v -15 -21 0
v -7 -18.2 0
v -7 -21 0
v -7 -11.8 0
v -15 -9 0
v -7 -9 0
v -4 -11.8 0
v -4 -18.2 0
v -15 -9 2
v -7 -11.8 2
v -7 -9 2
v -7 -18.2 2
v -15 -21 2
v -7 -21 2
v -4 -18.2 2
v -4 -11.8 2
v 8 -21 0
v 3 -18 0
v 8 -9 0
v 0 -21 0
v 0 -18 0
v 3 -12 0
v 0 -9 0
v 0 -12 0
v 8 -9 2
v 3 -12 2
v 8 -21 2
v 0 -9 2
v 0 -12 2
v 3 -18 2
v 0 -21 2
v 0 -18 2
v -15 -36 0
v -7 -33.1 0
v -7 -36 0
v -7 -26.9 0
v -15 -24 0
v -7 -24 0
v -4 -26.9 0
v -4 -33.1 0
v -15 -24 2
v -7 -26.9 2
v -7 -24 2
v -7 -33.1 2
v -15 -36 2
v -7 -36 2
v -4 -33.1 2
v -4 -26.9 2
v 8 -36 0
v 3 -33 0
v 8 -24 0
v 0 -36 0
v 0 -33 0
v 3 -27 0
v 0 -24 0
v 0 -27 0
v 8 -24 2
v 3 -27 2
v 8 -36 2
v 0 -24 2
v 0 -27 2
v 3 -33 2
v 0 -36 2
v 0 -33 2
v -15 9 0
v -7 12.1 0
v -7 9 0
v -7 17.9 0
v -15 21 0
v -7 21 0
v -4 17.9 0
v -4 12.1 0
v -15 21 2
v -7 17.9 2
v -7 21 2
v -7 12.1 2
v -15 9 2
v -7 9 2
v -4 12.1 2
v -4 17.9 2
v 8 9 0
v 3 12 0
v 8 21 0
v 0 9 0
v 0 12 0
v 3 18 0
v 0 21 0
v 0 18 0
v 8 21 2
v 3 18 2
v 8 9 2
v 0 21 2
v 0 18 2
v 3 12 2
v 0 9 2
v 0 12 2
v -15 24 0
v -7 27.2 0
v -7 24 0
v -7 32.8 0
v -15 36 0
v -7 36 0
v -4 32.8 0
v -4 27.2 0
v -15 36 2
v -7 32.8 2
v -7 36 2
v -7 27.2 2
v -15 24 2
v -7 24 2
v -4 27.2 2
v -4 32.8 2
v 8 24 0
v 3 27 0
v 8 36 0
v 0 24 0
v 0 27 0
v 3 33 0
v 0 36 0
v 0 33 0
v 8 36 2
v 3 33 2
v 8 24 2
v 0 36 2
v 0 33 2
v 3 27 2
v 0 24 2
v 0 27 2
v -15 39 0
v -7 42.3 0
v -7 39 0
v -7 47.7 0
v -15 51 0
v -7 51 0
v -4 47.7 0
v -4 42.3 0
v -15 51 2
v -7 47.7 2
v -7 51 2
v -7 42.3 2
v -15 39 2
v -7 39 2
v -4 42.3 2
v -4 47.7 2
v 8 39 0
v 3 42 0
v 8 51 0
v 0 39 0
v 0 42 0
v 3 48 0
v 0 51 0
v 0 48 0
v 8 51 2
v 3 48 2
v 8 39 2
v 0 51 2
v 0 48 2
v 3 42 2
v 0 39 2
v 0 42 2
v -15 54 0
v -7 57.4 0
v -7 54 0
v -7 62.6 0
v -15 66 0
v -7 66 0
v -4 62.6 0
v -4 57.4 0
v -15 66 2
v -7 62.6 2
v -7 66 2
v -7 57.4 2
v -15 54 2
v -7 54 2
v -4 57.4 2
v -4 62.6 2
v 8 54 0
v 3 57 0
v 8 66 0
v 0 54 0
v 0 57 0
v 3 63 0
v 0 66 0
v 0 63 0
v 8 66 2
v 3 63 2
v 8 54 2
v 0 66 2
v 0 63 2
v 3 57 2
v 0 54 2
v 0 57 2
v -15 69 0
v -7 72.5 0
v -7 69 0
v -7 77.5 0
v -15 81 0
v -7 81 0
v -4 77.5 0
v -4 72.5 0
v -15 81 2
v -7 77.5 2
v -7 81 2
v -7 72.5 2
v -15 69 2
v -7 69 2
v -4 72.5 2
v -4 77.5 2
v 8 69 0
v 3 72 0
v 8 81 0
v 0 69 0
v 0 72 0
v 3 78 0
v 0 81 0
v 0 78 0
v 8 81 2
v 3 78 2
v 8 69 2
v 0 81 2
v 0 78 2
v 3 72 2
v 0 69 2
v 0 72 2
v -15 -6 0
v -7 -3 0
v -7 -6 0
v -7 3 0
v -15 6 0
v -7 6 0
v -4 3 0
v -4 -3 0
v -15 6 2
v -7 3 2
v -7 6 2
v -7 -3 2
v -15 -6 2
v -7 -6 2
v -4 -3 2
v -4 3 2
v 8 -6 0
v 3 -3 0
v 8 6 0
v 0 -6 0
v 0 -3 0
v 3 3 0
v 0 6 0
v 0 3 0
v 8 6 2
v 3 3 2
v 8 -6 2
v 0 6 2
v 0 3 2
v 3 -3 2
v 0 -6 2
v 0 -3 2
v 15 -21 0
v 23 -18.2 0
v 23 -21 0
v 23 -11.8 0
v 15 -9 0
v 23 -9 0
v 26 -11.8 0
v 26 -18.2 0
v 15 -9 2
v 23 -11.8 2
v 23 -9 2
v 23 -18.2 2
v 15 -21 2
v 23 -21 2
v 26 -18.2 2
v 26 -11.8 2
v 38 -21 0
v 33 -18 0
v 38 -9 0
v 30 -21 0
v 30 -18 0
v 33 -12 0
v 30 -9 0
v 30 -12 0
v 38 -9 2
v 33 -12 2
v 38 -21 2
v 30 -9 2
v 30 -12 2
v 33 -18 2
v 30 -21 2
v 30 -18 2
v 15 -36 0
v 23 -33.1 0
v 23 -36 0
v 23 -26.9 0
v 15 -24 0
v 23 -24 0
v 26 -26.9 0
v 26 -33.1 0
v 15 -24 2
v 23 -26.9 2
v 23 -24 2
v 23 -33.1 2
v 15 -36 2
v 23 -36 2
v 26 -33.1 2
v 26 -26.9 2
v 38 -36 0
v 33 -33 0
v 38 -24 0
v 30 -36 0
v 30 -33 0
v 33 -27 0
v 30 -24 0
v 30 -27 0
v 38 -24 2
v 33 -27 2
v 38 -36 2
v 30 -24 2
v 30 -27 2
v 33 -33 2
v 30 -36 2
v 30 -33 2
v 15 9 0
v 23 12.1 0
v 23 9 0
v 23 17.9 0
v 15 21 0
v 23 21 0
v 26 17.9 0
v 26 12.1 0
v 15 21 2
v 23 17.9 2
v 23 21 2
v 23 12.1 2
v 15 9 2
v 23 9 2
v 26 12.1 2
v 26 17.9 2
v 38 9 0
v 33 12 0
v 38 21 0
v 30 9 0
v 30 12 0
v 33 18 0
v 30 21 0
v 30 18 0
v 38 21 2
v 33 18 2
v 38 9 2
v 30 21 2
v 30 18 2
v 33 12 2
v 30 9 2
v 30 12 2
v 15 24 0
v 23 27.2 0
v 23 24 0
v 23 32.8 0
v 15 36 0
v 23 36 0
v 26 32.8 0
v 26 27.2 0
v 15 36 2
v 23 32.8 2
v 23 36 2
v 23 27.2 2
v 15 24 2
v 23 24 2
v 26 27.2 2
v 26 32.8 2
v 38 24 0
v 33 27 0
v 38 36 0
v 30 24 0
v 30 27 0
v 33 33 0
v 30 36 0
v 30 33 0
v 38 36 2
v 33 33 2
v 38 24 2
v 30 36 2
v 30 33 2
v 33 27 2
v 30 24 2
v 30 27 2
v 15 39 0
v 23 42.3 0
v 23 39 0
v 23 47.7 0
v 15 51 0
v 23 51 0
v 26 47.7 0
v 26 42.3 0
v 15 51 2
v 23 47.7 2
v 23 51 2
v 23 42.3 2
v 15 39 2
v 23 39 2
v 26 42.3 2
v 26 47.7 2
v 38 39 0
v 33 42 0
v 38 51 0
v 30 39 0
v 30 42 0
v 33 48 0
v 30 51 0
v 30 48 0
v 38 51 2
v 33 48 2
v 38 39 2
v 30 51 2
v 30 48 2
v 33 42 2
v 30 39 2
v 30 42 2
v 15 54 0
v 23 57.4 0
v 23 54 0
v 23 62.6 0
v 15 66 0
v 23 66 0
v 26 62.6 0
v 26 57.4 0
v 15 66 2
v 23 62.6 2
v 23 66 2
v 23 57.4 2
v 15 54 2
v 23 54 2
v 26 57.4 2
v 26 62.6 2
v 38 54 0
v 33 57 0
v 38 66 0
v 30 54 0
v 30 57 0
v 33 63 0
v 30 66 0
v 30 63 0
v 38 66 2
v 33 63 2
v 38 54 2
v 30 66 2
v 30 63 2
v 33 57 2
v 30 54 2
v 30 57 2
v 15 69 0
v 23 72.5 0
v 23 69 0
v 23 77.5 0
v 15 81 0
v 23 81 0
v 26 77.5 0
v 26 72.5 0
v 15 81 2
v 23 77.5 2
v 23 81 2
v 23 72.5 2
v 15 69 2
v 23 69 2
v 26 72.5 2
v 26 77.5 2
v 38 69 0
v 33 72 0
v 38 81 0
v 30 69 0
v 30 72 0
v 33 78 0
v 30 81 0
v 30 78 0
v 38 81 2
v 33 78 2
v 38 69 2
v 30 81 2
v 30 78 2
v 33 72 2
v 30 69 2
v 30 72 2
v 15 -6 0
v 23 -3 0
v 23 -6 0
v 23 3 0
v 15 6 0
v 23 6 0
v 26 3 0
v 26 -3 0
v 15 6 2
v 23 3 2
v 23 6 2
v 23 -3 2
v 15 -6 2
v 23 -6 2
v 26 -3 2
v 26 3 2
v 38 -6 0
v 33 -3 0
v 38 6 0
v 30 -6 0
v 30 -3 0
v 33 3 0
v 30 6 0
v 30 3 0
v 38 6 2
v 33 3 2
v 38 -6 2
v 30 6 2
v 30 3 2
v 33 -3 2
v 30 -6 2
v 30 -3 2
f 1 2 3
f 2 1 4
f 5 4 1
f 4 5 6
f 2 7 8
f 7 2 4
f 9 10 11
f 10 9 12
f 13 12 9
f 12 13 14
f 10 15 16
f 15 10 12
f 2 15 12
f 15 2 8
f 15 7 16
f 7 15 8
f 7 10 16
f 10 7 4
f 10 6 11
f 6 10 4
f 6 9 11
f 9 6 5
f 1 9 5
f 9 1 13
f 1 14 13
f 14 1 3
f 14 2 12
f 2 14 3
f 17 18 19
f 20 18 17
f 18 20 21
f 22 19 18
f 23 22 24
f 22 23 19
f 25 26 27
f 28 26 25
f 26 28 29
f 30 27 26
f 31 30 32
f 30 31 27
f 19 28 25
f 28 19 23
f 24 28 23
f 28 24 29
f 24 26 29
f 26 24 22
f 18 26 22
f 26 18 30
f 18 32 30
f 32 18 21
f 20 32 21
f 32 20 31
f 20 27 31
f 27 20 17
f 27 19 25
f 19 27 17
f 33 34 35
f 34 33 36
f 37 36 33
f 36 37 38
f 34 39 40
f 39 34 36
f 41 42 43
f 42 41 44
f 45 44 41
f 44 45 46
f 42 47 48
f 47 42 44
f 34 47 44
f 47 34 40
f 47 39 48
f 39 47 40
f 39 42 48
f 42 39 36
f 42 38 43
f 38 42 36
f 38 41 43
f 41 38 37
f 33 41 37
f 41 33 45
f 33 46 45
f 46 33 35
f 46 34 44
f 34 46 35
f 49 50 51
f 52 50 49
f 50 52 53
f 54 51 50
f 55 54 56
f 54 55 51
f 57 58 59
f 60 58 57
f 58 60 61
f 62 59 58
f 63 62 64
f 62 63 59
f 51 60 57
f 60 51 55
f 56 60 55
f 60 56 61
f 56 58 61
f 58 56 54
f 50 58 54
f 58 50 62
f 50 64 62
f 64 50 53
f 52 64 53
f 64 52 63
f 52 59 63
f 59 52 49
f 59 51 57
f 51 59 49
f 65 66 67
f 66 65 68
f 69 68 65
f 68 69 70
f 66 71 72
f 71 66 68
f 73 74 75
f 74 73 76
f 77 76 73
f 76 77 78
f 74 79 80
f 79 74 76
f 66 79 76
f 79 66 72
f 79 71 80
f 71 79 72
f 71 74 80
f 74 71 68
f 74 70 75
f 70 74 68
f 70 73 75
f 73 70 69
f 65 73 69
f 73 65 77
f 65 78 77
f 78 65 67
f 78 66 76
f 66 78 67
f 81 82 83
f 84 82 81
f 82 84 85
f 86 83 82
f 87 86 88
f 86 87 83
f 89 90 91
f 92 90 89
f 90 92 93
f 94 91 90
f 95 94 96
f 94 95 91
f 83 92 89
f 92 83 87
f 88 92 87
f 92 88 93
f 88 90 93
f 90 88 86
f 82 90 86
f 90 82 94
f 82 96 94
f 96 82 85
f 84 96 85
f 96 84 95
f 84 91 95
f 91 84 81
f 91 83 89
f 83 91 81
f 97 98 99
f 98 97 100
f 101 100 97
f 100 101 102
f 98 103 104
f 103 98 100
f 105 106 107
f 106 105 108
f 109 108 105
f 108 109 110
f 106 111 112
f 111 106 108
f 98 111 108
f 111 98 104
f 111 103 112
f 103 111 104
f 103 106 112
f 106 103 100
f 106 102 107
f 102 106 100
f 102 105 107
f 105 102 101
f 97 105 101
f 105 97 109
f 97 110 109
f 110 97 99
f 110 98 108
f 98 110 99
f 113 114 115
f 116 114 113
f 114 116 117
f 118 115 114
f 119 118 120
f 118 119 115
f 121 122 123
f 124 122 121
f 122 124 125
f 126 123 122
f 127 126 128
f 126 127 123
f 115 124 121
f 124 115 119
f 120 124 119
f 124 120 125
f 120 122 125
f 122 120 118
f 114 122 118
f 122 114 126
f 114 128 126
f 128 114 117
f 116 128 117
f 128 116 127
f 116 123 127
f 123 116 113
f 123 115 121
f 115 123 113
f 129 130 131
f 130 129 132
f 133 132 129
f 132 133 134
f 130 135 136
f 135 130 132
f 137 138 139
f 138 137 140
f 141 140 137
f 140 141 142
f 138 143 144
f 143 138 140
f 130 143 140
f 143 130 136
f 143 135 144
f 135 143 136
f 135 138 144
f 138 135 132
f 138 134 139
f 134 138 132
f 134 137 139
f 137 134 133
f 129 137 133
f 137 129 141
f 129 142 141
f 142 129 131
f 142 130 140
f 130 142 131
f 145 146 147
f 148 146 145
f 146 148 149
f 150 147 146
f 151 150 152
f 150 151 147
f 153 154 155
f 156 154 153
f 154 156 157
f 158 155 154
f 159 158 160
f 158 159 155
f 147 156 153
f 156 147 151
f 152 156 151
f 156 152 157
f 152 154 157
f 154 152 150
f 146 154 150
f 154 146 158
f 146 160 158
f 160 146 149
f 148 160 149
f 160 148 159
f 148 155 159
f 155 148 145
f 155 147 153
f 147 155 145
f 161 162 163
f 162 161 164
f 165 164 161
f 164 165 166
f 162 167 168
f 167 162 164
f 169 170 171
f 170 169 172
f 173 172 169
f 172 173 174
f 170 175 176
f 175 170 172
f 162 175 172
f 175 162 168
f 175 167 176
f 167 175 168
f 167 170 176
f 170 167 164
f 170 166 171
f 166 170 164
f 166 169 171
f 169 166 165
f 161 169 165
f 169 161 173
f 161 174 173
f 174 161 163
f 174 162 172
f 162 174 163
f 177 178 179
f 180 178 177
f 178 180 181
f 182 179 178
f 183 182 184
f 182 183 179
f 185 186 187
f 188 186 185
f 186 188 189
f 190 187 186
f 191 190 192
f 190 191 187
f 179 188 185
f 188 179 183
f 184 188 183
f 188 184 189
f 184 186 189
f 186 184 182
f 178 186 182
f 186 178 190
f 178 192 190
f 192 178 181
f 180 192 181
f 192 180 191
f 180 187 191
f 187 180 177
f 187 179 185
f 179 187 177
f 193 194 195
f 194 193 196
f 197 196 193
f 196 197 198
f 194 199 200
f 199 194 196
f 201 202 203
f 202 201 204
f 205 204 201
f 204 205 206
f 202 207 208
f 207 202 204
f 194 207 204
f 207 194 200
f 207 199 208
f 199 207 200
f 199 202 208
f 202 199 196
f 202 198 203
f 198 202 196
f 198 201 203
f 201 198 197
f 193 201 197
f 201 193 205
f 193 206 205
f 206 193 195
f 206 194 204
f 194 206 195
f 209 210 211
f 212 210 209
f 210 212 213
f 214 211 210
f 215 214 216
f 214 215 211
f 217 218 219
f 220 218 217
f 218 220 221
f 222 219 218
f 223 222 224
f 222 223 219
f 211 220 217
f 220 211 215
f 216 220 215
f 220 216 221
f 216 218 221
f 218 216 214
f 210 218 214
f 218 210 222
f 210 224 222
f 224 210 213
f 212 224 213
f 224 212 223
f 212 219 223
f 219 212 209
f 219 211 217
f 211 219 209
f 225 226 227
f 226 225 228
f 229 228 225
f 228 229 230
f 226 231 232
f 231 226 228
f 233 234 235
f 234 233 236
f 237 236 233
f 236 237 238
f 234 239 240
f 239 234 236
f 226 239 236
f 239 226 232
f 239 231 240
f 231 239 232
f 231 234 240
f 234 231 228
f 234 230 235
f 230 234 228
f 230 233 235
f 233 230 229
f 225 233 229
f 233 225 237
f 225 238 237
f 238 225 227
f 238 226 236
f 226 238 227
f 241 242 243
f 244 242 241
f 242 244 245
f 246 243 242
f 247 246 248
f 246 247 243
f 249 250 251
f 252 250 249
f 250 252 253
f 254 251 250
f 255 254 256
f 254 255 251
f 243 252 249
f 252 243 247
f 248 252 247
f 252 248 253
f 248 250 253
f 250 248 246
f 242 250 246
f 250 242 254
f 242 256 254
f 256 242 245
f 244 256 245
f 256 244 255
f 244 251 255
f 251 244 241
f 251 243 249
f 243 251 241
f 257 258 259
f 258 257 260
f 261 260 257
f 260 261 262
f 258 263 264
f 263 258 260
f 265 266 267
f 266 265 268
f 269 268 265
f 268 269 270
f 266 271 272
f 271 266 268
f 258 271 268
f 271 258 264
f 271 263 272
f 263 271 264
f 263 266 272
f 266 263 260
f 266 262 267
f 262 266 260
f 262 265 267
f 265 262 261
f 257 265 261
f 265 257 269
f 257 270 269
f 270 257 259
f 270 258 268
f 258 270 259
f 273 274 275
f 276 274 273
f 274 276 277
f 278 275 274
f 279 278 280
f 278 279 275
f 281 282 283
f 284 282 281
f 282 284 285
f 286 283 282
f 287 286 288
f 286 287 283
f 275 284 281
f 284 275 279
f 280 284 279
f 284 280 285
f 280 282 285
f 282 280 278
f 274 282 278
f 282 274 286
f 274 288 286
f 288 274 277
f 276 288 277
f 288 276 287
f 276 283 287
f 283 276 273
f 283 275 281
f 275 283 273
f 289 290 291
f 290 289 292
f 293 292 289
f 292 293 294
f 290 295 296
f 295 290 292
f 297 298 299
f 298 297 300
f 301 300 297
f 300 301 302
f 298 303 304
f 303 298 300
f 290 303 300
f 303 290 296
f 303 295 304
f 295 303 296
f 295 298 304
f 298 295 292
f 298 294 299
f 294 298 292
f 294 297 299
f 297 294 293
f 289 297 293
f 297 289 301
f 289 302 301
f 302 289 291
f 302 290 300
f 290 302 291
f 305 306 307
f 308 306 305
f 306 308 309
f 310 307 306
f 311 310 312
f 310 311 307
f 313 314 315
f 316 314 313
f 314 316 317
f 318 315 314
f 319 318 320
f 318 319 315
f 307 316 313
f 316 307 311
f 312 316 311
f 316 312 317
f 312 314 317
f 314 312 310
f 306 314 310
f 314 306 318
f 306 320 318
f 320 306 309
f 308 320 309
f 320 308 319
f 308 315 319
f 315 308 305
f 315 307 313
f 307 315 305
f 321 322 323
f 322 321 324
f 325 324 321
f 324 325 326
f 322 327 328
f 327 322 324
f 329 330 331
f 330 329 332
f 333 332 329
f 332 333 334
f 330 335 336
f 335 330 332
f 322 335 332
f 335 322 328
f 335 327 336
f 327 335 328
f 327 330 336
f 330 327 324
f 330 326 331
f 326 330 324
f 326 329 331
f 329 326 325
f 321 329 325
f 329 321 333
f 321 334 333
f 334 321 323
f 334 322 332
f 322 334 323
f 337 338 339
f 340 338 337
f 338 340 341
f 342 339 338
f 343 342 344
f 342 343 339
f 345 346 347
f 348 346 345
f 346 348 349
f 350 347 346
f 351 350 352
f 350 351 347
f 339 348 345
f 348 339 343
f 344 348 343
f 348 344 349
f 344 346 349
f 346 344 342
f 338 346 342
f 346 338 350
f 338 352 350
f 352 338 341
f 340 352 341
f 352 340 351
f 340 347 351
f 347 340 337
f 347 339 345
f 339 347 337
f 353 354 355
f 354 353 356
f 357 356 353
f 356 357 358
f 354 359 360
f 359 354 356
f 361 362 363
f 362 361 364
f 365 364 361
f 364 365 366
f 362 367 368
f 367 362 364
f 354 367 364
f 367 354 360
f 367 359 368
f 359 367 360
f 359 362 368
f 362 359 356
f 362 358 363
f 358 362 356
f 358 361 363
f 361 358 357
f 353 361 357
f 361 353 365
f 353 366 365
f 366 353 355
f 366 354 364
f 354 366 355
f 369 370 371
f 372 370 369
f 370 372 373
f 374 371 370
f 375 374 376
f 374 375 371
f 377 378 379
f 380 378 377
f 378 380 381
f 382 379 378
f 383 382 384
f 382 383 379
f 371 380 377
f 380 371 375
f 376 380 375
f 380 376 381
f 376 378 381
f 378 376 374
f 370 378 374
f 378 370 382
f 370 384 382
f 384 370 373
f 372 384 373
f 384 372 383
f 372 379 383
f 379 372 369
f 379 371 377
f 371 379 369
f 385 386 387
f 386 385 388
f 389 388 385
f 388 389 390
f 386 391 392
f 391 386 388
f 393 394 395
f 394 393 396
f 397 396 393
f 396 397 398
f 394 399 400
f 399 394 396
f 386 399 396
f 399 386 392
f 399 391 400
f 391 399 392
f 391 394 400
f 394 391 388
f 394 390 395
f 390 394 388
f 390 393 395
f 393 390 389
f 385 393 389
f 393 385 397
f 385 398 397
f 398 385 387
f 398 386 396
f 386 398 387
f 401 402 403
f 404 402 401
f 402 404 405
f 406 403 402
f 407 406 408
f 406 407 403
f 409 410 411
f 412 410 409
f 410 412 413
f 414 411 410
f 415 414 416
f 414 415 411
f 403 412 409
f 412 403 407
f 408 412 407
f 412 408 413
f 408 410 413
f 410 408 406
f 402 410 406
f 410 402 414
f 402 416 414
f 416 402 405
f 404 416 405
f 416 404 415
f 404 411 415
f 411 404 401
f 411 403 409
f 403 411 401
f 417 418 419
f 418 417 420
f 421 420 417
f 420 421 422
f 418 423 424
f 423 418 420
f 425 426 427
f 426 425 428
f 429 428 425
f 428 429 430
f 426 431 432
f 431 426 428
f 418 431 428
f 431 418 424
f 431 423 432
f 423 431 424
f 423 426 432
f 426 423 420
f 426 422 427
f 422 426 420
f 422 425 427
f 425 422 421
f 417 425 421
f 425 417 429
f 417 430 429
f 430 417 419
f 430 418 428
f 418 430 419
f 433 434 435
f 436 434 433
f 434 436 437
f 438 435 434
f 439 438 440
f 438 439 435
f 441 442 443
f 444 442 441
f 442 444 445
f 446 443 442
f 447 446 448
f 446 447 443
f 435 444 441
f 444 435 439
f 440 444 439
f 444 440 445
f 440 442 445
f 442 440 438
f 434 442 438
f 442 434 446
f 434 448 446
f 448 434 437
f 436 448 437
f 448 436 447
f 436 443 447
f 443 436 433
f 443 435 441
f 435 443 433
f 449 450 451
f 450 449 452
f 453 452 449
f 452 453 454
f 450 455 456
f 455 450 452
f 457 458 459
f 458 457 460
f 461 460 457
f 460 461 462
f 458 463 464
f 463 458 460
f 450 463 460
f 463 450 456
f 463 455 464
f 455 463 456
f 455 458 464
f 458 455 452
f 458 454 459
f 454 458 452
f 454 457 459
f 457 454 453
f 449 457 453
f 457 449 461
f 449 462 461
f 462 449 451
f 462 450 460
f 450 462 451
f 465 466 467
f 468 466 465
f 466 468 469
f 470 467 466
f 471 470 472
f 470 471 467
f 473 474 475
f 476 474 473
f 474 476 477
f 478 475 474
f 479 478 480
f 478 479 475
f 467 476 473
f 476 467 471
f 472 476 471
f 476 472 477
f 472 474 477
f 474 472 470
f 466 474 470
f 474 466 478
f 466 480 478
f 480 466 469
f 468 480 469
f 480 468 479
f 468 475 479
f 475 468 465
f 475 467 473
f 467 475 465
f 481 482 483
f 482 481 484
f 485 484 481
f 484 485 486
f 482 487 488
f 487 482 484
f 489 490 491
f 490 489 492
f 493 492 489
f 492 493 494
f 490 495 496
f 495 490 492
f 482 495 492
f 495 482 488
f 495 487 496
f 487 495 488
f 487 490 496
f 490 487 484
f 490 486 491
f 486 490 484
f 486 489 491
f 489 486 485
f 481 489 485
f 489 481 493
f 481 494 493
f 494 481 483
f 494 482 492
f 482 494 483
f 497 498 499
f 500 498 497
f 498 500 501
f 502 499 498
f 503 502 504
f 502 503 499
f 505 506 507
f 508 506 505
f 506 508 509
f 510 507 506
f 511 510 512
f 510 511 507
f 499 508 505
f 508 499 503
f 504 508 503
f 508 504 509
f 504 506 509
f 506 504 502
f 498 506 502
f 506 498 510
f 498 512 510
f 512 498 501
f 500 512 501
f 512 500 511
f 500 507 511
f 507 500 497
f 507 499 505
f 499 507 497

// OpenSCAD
$fa=1;
$fs=0.4;
// Creates a nice macro for movements//from manual
module move(x=0,y=0,z=0,rx=0,ry=0,rz=0)
{ translate([x,y,z])rotate([rx,ry,rz]) children(); }
// Macro to repeat along x and/or y
module repeat(spacex=0,spacey=0){ children();move(x=spacex,y=spacey)children(); }
module mirrorx(){ children(); mirror([1,0,0]) children(); }//mirror across x (+x -> -x)
module mirrory(){ children(); mirror([0,1,0]) children(); }// mirror across y (+y -> -y)
module mirror4(){ mirrorx() mirrory() children(); }

module lin_ext(H=2)
{
	linear_extrude(height=H,convexity=10)children();
}

module joint_female(lw=3){
	lin_ext()mirrory(){
		difference()
		{
			mirrory()square([8,6]);
			mirrory()square([3,3]);
		}
	}
}
module joint_male(lw=3){

	lin_ext()move(x=-15){
		mirrory()square([8,6]);
		move(x=3)mirrory()square([8,lw]);
	}
}

repeat(spacex=30){
	move(y=-15){joint_male(3+0.2);joint_female(3-0.2);}
	move(y=-2*15){joint_male(3+0.1);joint_female(3-0.1);}
	joint_male();joint_female();
	move(y=15){joint_male(3-0.1);joint_female(3+0.1);}
	move(y=2*15){joint_male(3 - 0.2);joint_female(3+0.2);}
	move(y=3*15){joint_male(3 - 0.3);joint_female(3+0.3);}
	move(y=4*15){joint_male(3 - 0.4);joint_female(3+0.4);}
	move(y=5*15){joint_male(3 - 0.5);joint_female(3+0.5);}
}
